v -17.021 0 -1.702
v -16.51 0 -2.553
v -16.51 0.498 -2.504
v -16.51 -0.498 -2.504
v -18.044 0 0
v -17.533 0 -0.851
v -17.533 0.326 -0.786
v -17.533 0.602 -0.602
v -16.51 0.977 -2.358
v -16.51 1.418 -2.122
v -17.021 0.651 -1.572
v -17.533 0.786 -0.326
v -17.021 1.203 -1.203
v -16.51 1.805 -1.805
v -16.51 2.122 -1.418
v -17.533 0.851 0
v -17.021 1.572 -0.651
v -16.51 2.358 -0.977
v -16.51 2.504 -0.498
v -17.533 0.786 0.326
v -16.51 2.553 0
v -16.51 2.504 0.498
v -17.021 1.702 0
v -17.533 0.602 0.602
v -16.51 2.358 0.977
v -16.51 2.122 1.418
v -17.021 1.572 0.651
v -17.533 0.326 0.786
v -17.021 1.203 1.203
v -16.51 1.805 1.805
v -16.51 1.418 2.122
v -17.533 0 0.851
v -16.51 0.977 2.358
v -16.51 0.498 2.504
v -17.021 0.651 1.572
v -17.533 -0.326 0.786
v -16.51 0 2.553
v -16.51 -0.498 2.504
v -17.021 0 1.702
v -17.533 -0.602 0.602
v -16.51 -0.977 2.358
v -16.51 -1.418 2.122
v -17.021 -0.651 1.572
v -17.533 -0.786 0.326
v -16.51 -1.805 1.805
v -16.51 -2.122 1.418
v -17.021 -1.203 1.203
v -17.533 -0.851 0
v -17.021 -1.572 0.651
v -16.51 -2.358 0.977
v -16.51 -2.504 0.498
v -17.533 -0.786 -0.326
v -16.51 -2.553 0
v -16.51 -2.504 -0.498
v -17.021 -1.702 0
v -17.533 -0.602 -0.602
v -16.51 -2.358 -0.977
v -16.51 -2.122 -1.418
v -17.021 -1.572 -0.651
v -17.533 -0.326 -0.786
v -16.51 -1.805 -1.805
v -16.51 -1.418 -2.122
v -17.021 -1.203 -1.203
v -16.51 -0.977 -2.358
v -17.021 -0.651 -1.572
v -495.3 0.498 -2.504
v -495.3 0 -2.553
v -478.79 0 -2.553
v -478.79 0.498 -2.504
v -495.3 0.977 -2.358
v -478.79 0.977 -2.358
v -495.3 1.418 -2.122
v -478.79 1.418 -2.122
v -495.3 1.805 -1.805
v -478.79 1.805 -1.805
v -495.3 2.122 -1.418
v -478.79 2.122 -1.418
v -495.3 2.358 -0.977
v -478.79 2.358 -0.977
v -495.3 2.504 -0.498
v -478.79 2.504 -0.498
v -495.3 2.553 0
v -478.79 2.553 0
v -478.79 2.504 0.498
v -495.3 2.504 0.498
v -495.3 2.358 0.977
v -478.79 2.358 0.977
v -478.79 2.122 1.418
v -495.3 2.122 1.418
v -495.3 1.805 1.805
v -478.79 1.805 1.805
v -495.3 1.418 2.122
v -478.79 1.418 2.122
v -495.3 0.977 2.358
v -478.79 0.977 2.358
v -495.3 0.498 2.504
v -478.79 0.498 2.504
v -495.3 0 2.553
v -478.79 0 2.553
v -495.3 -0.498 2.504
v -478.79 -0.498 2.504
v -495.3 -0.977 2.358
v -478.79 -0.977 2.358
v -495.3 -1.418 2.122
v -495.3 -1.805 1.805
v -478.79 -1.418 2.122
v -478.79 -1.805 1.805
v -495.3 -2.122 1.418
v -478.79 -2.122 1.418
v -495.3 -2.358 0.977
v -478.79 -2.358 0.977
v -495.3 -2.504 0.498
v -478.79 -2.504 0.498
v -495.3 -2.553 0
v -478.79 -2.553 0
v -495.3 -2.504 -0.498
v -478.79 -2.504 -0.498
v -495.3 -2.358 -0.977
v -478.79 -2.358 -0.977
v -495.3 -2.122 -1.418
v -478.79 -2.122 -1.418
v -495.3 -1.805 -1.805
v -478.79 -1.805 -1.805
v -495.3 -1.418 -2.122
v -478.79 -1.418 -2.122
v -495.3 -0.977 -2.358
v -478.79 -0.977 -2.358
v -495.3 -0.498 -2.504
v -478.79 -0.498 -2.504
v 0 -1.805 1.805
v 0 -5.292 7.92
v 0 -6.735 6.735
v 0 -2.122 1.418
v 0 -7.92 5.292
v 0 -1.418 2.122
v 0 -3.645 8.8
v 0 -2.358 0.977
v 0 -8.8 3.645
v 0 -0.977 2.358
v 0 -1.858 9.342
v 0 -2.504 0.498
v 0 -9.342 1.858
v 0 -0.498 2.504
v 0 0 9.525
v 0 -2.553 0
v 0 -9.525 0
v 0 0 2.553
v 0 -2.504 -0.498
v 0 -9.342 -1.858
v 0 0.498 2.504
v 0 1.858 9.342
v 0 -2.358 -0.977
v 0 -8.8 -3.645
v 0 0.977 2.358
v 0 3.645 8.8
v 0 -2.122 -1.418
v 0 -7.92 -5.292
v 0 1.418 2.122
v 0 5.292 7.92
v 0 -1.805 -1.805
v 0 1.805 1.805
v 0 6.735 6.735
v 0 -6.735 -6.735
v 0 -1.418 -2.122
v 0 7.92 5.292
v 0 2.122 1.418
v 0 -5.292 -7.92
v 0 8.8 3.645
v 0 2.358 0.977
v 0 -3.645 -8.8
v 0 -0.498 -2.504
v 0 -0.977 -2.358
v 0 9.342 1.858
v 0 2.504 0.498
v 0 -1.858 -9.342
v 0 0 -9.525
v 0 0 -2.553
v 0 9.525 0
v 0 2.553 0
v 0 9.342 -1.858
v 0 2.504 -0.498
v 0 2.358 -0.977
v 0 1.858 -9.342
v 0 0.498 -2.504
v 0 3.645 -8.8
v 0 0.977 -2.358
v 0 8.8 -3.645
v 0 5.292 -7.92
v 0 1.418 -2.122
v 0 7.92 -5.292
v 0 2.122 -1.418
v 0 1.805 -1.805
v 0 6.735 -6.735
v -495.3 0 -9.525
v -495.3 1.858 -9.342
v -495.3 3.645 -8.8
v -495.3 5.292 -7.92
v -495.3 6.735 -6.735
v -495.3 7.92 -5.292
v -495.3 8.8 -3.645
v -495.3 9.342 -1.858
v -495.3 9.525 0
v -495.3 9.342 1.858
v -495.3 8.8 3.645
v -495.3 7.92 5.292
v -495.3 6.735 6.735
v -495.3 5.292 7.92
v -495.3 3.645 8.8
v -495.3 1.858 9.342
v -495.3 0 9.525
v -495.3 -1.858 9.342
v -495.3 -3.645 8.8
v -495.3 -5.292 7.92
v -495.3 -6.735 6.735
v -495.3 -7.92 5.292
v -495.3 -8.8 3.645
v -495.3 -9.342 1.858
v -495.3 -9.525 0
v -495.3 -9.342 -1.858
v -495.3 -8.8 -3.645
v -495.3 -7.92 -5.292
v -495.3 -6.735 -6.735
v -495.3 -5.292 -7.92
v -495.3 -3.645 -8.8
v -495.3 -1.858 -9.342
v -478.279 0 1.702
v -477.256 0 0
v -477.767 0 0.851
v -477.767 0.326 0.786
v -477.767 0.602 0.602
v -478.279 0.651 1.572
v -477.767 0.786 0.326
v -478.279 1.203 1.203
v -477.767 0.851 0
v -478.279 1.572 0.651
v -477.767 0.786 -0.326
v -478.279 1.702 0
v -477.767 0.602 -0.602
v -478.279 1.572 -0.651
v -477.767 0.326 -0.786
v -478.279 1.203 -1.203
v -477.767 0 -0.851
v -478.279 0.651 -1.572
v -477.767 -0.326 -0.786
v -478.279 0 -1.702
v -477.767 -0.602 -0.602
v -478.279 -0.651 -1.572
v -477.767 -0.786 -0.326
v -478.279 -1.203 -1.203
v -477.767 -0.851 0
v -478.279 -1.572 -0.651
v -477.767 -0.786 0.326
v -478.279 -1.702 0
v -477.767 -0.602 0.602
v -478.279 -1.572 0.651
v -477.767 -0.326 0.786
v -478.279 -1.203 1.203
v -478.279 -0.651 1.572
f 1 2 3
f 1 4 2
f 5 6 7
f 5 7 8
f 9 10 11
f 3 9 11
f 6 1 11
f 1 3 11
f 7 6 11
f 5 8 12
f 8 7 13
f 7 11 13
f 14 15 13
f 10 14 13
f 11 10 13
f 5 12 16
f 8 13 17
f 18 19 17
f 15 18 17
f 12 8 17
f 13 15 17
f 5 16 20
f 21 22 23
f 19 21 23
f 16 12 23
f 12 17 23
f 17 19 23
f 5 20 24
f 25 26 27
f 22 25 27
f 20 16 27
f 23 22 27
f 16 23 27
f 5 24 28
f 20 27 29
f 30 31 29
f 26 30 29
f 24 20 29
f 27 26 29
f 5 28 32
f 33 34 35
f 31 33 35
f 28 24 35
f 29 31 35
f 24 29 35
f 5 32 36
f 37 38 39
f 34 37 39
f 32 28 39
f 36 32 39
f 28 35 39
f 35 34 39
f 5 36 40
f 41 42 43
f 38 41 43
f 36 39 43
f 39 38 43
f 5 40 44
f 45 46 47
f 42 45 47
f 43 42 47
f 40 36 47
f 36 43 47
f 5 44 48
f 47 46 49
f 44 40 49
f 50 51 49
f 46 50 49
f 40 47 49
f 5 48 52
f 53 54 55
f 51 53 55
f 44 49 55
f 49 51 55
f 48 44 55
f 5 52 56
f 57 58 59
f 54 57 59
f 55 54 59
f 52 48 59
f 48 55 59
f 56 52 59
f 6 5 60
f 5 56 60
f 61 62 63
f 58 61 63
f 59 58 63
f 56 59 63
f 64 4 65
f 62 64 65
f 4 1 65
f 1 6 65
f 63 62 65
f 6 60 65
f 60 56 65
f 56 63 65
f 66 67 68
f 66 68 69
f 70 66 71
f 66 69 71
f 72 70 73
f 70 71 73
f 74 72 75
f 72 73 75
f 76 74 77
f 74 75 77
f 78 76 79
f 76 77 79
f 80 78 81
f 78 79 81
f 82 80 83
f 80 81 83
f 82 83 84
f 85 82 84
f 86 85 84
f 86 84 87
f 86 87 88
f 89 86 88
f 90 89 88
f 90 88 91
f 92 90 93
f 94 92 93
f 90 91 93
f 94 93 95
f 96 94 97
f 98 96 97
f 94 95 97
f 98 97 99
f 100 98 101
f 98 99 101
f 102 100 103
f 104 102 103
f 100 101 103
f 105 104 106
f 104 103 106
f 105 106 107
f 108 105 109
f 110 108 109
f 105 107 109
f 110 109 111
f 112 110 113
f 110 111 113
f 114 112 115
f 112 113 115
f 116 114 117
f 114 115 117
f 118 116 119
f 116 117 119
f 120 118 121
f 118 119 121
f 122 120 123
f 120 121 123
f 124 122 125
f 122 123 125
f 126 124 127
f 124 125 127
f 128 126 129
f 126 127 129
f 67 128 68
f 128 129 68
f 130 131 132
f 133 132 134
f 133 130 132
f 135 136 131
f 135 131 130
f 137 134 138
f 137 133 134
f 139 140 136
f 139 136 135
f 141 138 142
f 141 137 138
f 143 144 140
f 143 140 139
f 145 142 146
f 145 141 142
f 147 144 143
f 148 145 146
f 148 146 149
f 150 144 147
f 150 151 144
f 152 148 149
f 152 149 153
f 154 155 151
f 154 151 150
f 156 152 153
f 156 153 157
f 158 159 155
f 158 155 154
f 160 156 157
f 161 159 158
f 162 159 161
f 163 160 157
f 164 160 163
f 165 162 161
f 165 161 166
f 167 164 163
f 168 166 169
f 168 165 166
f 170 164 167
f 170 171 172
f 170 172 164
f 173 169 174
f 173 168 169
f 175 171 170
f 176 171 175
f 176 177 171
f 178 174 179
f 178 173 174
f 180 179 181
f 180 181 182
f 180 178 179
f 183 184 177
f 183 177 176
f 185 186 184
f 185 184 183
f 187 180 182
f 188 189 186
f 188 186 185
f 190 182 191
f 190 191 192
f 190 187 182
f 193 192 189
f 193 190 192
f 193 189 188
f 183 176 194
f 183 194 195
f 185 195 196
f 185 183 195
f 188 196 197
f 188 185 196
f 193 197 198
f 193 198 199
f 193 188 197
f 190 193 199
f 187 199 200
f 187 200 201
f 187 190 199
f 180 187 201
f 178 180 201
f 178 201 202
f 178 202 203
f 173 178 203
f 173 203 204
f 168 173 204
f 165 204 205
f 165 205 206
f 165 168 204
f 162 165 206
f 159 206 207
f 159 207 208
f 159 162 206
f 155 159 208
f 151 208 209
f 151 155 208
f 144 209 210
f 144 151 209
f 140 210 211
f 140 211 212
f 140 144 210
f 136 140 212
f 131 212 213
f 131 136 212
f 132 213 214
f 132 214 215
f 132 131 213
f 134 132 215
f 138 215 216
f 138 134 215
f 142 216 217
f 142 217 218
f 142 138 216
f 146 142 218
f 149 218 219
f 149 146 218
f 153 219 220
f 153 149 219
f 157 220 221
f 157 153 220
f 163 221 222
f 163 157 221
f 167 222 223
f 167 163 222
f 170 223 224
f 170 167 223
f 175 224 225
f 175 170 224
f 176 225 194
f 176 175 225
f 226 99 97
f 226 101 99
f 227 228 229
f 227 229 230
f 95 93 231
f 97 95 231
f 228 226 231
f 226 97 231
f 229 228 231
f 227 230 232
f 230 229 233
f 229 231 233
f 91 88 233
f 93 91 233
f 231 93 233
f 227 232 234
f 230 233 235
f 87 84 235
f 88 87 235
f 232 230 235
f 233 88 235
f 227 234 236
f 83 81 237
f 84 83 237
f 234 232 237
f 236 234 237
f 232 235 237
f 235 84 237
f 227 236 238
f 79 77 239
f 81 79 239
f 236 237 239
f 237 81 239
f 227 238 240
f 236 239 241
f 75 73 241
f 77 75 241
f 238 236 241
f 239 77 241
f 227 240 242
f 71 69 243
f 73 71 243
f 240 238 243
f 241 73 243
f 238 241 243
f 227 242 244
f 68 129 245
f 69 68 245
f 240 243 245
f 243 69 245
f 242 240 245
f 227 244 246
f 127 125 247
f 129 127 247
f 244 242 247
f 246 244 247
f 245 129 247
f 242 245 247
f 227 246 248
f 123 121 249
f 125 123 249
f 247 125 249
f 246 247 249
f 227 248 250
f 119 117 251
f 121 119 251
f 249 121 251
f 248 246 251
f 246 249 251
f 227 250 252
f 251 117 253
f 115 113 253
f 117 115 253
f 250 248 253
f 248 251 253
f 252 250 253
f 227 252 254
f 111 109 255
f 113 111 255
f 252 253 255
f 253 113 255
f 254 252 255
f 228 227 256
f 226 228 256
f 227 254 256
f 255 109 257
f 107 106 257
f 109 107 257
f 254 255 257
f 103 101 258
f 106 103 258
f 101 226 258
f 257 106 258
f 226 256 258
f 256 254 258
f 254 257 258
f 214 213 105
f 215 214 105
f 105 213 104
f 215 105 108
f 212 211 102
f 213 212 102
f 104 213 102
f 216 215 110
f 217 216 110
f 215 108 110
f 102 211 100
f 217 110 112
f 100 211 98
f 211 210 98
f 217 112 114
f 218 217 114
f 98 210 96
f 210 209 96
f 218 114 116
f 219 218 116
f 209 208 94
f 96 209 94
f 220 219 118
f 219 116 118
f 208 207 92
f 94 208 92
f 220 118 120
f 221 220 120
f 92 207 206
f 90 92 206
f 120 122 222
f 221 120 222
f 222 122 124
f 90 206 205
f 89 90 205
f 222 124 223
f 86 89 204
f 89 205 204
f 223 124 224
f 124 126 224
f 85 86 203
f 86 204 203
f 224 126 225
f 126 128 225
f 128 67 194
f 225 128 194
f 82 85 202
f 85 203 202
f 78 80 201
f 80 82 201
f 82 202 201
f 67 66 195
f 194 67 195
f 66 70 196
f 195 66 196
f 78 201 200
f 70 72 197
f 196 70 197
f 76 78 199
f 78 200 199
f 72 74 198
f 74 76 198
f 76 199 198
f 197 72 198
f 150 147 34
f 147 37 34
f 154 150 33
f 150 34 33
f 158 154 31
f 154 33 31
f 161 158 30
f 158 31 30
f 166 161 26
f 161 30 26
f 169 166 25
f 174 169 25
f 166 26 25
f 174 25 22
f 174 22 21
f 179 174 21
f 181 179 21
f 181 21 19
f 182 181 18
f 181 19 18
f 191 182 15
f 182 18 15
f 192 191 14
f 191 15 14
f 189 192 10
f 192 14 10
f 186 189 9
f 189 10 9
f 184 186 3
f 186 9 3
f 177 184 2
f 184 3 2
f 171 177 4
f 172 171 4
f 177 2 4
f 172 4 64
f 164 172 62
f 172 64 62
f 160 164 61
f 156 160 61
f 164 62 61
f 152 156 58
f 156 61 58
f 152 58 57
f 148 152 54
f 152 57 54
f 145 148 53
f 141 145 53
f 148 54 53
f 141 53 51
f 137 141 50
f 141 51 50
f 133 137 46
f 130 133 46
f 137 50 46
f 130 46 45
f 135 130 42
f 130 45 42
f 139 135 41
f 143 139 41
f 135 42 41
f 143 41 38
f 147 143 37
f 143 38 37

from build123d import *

# Parameters (mm, degrees)
SKETCH1_R                   = 9.525
BOSS_EXTRUDE1_DEPTH         = 495.3
F_1_4_20_TAPPED_HOLE1_D     = 5.1054
F_1_4_20_TAPPED_HOLE1_DEPTH = 16.51
F_1_4_20_TAPPED_HOLE1_TIP   = 1.533816902
F_1_4_20_TAPPED_HOLE2_D     = 5.1054
F_1_4_20_TAPPED_HOLE2_DEPTH = 16.51
F_1_4_20_TAPPED_HOLE2_TIP   = 1.533816902


with BuildPart() as part:
    # Sketch1 → Boss-Extrude1 (new body)
    with BuildSketch(Plane(origin=(0, 0, 0), x_dir=(0, 0, -1), z_dir=(1, 0, 0))):
        Circle(SKETCH1_R)
    extrude(amount=-BOSS_EXTRUDE1_DEPTH)

    # 1/4-20 Tapped Hole1
    with Locations(Plane(origin=(0, 0, 0), x_dir=(0, 0, -1), z_dir=(1, 0, 0))):
        with Locations((0, 0)):
            Hole(F_1_4_20_TAPPED_HOLE1_D / 2, depth=F_1_4_20_TAPPED_HOLE1_DEPTH)
            with Locations((0, 0, -(F_1_4_20_TAPPED_HOLE1_DEPTH + F_1_4_20_TAPPED_HOLE1_TIP / 2))):  # 118° drill point
                Cone(0, F_1_4_20_TAPPED_HOLE1_D / 2, F_1_4_20_TAPPED_HOLE1_TIP, mode=Mode.SUBTRACT)

    # 1/4-20 Tapped Hole2
    with Locations(Plane.ZY.offset(495.3)):
        with Locations((0, 0)):
            Hole(F_1_4_20_TAPPED_HOLE2_D / 2, depth=F_1_4_20_TAPPED_HOLE2_DEPTH)
            with Locations((0, 0, -(F_1_4_20_TAPPED_HOLE2_DEPTH + F_1_4_20_TAPPED_HOLE2_TIP / 2))):  # 118° drill point
                Cone(0, F_1_4_20_TAPPED_HOLE2_D / 2, F_1_4_20_TAPPED_HOLE2_TIP, mode=Mode.SUBTRACT)


solid = part.part
